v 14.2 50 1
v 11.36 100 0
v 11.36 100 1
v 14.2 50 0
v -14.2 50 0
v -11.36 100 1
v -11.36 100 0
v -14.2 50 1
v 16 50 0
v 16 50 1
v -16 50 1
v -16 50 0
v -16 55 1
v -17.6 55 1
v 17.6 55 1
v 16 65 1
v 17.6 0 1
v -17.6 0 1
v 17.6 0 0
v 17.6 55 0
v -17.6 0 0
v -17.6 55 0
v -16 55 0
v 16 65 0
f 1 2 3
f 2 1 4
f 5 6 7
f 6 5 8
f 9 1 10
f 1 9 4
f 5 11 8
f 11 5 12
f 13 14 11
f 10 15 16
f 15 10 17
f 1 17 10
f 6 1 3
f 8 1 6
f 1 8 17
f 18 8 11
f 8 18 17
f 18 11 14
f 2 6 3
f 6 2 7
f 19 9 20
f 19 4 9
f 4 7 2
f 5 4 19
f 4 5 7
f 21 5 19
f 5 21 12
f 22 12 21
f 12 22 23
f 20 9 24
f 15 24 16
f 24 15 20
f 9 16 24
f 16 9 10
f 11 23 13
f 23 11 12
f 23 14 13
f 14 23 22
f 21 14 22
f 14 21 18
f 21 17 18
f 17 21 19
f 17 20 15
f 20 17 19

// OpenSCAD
// file: SketchUtils.scad
// Draws a rod between two points with a given thickness (by default 0.1)
// The rod has two spherical endcaps which are centered around the endpoints
// Therefore it is actually a bit wider
module rod(from, to, thickness = 0.1) {
    hull() {
            translate(from) sphere(thickness);
            translate(to) sphere(thickness);
    }
}

// Draws multiple rods between the list of coordinates with a given thickness
module rods(coords, thickness = 0.1) {
    for (i = [0:len(coords)-2]) {
        rod(coords[i], coords[i+1], thickness);
    }
}

// Draws a label with 'l' with a given size and color such that it always
// faces the direction of the viewport
module label(l, size = 1, c="black") {
    color(c) rotate($vpr) text(str(l), size);
}

rod([0, 0, 0], [100, 100, 100], 7);

rods([for (i = [0:90:360*3]) [cos(i) * 70, sin(i) * 40, i-360*1.5]], 3);

translate([100, 100, 100]) label("This is an auto adjusting label!", 50);
    
// file: MathUtils.scad
function rad2deg(rad) = 180/PI * rad;

function deg2rad(deg) = PI/180 * deg;

function sum(v, from, to) = (to==from ? 0 : v[to-1] + sum(v,from, to-1));

// Converts polar coordinates to cartesian coordinates
function pol2cart(s) = [
	s[2]*sin(s[1])*cos(s[0]),
	s[2]*sin(s[1])*sin(s[0]),
	s[2]*cos(s[1])
	];

// Converts cartesian coordinates to polar coordinates
function cart2pol(c) = [
    atan2(c[1],c[0]),
    atan2(norm([c[0], c[1]]), c[2]),
    norm(c)
	];

// Projects spherical coordinates to a circle of a given radius (default 1)
// This basically just overwrites the radius of the spherical coordinate
function projPol2sphere(s, r = 1) = [s[0], s[1], r];

// Projects a cartesian coordinate to a sphere with a given radius (by default 1)
function projCart2sphere(c, r = 1) = pol2cart(projPol2sphere(cart2pol
(c), r));

// Projects a list of cartesian coordinates to a sphere with a given radius
function projCarts2sphere(carts, r = 1) = [for (cart = carts) pol2cart(projPol2sphere(cart2pol
(cart), r))];

// Places its children at some polar coordinates and rotates in such a way, that it looks
// away from the center of the sphere. Usefull if you want to place something ontop of
// a sphere
module shpericalPlace(s) {
    rotate([0, s[1], s[0]])
    translate([0, 0, s[2]]) {
        children([0:$children-1]);
    }
}

use <SketchUtils.scad>

// Demo for projCart2sphere
// Here we first generate 100 random points, then we draw rods between those points
// and their projections to a sphere
randPoints = [for (i = [0:100]) rands(-100, 100, 3)];
for(point = randPoints) {
    rod(point, projCart2sphere(point, 50), 1);
}


// Demo for sphericalPlace
// Here we place some funny shape onto a sphere
module funnyShape() {
    translate([0, 0, 20]) cube([10, 10, 40],center=true);
    translate([0, 0, 40]) sphere(10);
}
shpericalPlace([30, -70, 50]) funnyShape();
shpericalPlace([30, 70, 50]) funnyShape();
shpericalPlace([-30, 180, 50]) funnyShape();

// Demo to show how to compute sums
list = [1, 1, 2, 3, 4, 5];
echo(sum(list, 0, len(list)));
// main file
use <MathUtils.scad>
module makeConnector(angles, labels, labelsize, labeltranslate, labelrotate=0, labelHeight=100000) {
    projection() 
    difference() {
        for(i = [0:len(angles)-1]) {
            echo(labels[i], sum(angles, 0, i));
            rotate([0, 0, -sum(angles, 0, i)]) {
                children(0);
            }
        }
        for(i = [0:len(angles)-1]) {
            echo(labels[i], sum(angles, 0, i));
            rotate([0, 0, -sum(angles, 0, i)]) {
                translate([labeltranslate[0], labeltranslate[1], -labelHeight/2])linear_extrude(labelHeight)  rotate([0, 0, labelrotate]) text(str(labels[i]), labelsize);
            }
        }
    }
}

module make5V_HCBABC_connector(labelsize, labeltranslate, labelrotate=0) {
    makeConnector([65.90224464, 59.51429452, 54.58346084, 54.58346084, 59.51429452, 65.90224464], ["H", "C", "B", "A", "B", "C"], labelsize, labeltranslate, labelrotate) {
        children(0);
    }
}

module make5V_IFDHDF_connector(labelsize, labeltranslate, labelrotate=0) {
    makeConnector([60.461017, 62.94954087, 56.58944213, 56.58944213, 62.94954087, 60.461017], ["I", "F", "D", "H", "D", "F"], labelsize, labeltranslate, labelrotate) {
        children(0);
    }
}

module make5V_DFIF_connector(labelsize, labeltranslate, labelrotate=0) {
    makeConnector([62.94954087, 60.461017, 60.461017, 62.94954087], ["D", "F", "I", "F"], labelsize, labeltranslate, labelrotate) {
        children(0);
    }
}

module make5V_CCDEED_connector(labelsize, labeltranslate, labelrotate=0) {
    makeConnector([62.30453005, 58.90951252, 58.84801223, 62.18042045, 58.84801223, 58.90951252], ["C", "C", "D", "E", "E", "D"], labelsize, labeltranslate, labelrotate) {
        children(0);
    }
}

module make5V_DEED_connector(labelsize, labeltranslate, labelrotate=0) {
    makeConnector([58.84801223, 62.18042045, 58.84801223, 58.90951252], ["D", "E", "E", "D"], labelsize, labeltranslate, labelrotate) {
        children(0);
    }
}

module make5V_GGEFFE_connector(labelsize, labeltranslate, labelrotate=0) {
    makeConnector([60.53957579, 59.69474601, 59.73016166, 60.61060889, 59.73016166, 59.69474601], ["G", "G", "E", "F", "F", "E"], labelsize, labeltranslate, labelrotate) {
        children(0);
    }
}

module make5V_GEFF_connector(labelsize, labeltranslate, labelrotate=0) {
    makeConnector([59.69474601, 59.73016166, 60.61060889, 59.73016166], ["G", "E", "F", "F"], labelsize, labeltranslate, labelrotate) {
        children(0);
    }
}

module make5V_AAAAA_connector(labelsize, labeltranslate, labelrotate=0) {
    makeConnector([72, 72, 72, 72, 72], ["A", "A", "A", "A", "A"], labelsize, labeltranslate, labelrotate) {
        children(0);
    }
}

module makeAll5VConnecotrs(spacing, labelsize, labeltranslate, labelrotate=0) {
    make5V_GEFF_connector(labelsize,  labeltranslate, labelrotate)
       children(0);
    
    translate([spacing, 0, 0]) make5V_DEED_connector(labelsize,  labeltranslate, labelrotate)
       children(0);

    translate([spacing*2, 0, 0]) make5V_DFIF_connector(labelsize,  labeltranslate, labelrotate)
       children(0);

    translate([0, spacing, 0]) make5V_AAAAA_connector(labelsize,  labeltranslate, labelrotate)
       children(0);

    translate([spacing, spacing, 0]) make5V_GGEFFE_connector(labelsize,  labeltranslate, labelrotate)
       children(0);

    translate([spacing*2, spacing, 0]) make5V_CCDEED_connector(labelsize,  labeltranslate, labelrotate)
       children(0);

    translate([0, spacing*2, 0]) make5V_IFDHDF_connector(labelsize,  labeltranslate, labelrotate)
       children(0);

    translate([spacing, spacing*2, 0]) make5V_HCBABC_connector(labelsize,  labeltranslate, labelrotate)
       children(0);
}
module clockConnectorPin(tubeDiam = 32, 
                         tubeInnerDiam = 28.4, 
                         connRad = 80, 
                         connInnerRad = 70, 
                         connThickness = 3, 
                         clipholeDiam = 5) {
    tubeWall = (tubeDiam-tubeInnerDiam)/2;
    difference() {
        translate([-(tubeDiam-2*tubeWall)/2, 0, 0]) cube([tubeDiam-2*tubeWall, connRad, connThickness]);
        linear_extrude() polygon([[0, connInnerRad/2], [-tubeWall, connRad], [tubeWall, connRad]]);
    }
    translate([(tubeDiam-2*tubeWall)/2, connRad-clipholeDiam, 0]) cube([tubeWall, clipholeDiam, connThickness]);
    translate([-(tubeDiam-2*tubeWall)/2-tubeWall, connRad-clipholeDiam, 0]) cube([tubeWall, clipholeDiam, connThickness]);
}

module pressfitConnectorPin(tubeDiam, tubeInnerDiam, connDiam, conInnerDiam, taper) {
    linear_extrude(1) polygon([[tubeInnerDiam/2, conInnerDiam/2], [(tubeInnerDiam/2)*taper, connDiam/2], [-(tubeInnerDiam/2)*taper, connDiam/2], [-tubeInnerDiam/2, conInnerDiam/2]]); //Stump cone
    linear_extrude(1) polygon([
        [(tubeDiam/2)*1.1, 0],
        [(tubeDiam/2)*1.1, (conInnerDiam/2)*1.1], 
        [(tubeDiam/2), (conInnerDiam/2)*1.3], 
        [(tubeDiam/2), (conInnerDiam/2)], 
        [-(tubeDiam/2), (conInnerDiam/2)],
        [-(tubeDiam/2), (conInnerDiam/2)*1.1],
        [-(tubeDiam/2)*1.1, (conInnerDiam/2)*1.1],
        [-(tubeDiam/2)*1.1, 0],
    ]);
}

    pressfitConnectorPin(32, 28.4, 200, 100, 0.8);

//make5V_DFIF_connector(10,  [-5, 20], 0) {
//    pressfitConnectorPin(32, 28.4, 200, 100, 0.8);
//}

//makeConnector([30, 45, 30, 45], ["A", "B", "C", "D", "E"], 0.5, 8, 1) {
//    translate([5, 0, 0]) cube([10, 2, 0.1], center=true);
//}
